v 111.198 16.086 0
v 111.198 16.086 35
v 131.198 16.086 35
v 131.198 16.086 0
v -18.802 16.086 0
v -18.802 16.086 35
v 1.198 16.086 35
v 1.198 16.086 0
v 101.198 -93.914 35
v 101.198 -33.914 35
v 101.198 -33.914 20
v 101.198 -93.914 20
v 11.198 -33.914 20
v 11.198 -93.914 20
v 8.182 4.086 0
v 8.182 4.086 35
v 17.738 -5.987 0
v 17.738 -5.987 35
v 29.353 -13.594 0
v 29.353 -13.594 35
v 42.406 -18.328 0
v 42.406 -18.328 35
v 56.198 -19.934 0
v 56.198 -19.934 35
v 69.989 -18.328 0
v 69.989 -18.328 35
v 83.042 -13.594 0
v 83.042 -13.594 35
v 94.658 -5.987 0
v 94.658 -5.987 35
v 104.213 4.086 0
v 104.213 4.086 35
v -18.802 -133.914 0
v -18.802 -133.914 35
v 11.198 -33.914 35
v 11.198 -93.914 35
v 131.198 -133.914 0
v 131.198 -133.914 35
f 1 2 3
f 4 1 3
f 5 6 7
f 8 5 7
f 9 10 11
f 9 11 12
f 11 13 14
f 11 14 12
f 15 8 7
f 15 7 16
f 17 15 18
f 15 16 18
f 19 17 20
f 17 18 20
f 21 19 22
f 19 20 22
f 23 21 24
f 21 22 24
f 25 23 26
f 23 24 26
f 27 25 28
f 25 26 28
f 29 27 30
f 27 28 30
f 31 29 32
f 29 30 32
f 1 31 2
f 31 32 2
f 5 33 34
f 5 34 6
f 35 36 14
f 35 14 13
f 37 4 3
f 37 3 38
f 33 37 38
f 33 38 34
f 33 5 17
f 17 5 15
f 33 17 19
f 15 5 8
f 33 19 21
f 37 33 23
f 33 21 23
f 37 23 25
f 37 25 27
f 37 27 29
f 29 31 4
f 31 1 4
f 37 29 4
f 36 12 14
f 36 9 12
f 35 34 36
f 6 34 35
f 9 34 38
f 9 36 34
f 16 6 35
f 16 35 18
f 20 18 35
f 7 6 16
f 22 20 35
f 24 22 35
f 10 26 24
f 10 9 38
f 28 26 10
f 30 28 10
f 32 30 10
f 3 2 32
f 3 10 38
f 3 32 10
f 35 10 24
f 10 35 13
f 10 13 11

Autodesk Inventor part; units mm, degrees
ref_plane "YZ Plane" through (0, 0, 0) normal (1, 0, 0) x (0, 1, 0)
ref_plane "XZ Plane" through (0, 0, 0) normal (0, 1, 0) x (-1, 0, 0)
ref_plane "XY Plane" through (0, 0, 0) normal (0, 0, 1) x (1, 0, 0)
sketch "Sketch1" plane through (0, 0, 0) normal (0, 0, 1) x (1, 0, 0)
  line L0 (-18.8022, 16.0864) -> (131.1978, 16.0864)
  line L1 (131.1978, 16.0864) -> (131.1978, -133.9136)
  line L2 (131.1978, -133.9136) -> (-18.8022, -133.9136)
  line L3 (-18.8022, -133.9136) -> (-18.8022, 16.0864)
  point P0 (0, 0)
  dimension "d0" = 150
  dimension "d1" = 150
extrude "Extrusion1" add sketch "Sketch1" along normal blind 35
sketch "Sketch2" plane through (0, 0, 35) normal (0, 0, 1) x (1, 0, 0)
  line L0 (-18.8022, -133.9136) -> (131.1978, -133.9136) projected
  line L1 (-18.8022, 16.0864) -> (-18.8022, -133.9136) projected
  line L2 (131.1978, -133.9136) -> (131.1978, 16.0864) projected
  line L3 (-18.8022, 16.0864) -> (1.1978, 16.0864)
  line L4 (131.1978, 16.0864) -> (-18.8022, 16.0864) projected
  line L5 (131.1978, 16.0864) -> (111.1978, 16.0864)
  arc A0 (1.1978, 16.0864) -> (111.1978, 16.0864) centre (56.1978, 40.0655) ccw
  line L6 (1.1978, 16.0864) -> (111.1978, 16.0864)
  line L7 (56.1978, -93.9136) -> (-18.8022, -93.9136)
  line L8 (56.1978, -93.9136) -> (131.1978, -93.9136)
  line L9 (56.1978, -93.9136) -> (11.1978, -93.9136)
  line L10 (11.1978, -93.9136) -> (11.1978, -33.9136)
  line L11 (11.1978, -33.9136) -> (101.1978, -33.9136)
  line L12 (101.1978, -33.9136) -> (101.1978, -93.9136)
  point P0 (0, 0)
  dimension "d5" = 20
  dimension "d6" = 20
  dimension "d7" = 60
  dimension "d10" = 60
  dimension "d11" = 90
  dimension "d12" = 60
extrude "Extrusion2" cut sketch "Sketch2" against normal blind 35 contours L4 A0
extrude "Extrusion3" cut sketch "Sketch2" against normal blind 15 contours L10 L11 L12 L8 L7
properties part number "Version1"
